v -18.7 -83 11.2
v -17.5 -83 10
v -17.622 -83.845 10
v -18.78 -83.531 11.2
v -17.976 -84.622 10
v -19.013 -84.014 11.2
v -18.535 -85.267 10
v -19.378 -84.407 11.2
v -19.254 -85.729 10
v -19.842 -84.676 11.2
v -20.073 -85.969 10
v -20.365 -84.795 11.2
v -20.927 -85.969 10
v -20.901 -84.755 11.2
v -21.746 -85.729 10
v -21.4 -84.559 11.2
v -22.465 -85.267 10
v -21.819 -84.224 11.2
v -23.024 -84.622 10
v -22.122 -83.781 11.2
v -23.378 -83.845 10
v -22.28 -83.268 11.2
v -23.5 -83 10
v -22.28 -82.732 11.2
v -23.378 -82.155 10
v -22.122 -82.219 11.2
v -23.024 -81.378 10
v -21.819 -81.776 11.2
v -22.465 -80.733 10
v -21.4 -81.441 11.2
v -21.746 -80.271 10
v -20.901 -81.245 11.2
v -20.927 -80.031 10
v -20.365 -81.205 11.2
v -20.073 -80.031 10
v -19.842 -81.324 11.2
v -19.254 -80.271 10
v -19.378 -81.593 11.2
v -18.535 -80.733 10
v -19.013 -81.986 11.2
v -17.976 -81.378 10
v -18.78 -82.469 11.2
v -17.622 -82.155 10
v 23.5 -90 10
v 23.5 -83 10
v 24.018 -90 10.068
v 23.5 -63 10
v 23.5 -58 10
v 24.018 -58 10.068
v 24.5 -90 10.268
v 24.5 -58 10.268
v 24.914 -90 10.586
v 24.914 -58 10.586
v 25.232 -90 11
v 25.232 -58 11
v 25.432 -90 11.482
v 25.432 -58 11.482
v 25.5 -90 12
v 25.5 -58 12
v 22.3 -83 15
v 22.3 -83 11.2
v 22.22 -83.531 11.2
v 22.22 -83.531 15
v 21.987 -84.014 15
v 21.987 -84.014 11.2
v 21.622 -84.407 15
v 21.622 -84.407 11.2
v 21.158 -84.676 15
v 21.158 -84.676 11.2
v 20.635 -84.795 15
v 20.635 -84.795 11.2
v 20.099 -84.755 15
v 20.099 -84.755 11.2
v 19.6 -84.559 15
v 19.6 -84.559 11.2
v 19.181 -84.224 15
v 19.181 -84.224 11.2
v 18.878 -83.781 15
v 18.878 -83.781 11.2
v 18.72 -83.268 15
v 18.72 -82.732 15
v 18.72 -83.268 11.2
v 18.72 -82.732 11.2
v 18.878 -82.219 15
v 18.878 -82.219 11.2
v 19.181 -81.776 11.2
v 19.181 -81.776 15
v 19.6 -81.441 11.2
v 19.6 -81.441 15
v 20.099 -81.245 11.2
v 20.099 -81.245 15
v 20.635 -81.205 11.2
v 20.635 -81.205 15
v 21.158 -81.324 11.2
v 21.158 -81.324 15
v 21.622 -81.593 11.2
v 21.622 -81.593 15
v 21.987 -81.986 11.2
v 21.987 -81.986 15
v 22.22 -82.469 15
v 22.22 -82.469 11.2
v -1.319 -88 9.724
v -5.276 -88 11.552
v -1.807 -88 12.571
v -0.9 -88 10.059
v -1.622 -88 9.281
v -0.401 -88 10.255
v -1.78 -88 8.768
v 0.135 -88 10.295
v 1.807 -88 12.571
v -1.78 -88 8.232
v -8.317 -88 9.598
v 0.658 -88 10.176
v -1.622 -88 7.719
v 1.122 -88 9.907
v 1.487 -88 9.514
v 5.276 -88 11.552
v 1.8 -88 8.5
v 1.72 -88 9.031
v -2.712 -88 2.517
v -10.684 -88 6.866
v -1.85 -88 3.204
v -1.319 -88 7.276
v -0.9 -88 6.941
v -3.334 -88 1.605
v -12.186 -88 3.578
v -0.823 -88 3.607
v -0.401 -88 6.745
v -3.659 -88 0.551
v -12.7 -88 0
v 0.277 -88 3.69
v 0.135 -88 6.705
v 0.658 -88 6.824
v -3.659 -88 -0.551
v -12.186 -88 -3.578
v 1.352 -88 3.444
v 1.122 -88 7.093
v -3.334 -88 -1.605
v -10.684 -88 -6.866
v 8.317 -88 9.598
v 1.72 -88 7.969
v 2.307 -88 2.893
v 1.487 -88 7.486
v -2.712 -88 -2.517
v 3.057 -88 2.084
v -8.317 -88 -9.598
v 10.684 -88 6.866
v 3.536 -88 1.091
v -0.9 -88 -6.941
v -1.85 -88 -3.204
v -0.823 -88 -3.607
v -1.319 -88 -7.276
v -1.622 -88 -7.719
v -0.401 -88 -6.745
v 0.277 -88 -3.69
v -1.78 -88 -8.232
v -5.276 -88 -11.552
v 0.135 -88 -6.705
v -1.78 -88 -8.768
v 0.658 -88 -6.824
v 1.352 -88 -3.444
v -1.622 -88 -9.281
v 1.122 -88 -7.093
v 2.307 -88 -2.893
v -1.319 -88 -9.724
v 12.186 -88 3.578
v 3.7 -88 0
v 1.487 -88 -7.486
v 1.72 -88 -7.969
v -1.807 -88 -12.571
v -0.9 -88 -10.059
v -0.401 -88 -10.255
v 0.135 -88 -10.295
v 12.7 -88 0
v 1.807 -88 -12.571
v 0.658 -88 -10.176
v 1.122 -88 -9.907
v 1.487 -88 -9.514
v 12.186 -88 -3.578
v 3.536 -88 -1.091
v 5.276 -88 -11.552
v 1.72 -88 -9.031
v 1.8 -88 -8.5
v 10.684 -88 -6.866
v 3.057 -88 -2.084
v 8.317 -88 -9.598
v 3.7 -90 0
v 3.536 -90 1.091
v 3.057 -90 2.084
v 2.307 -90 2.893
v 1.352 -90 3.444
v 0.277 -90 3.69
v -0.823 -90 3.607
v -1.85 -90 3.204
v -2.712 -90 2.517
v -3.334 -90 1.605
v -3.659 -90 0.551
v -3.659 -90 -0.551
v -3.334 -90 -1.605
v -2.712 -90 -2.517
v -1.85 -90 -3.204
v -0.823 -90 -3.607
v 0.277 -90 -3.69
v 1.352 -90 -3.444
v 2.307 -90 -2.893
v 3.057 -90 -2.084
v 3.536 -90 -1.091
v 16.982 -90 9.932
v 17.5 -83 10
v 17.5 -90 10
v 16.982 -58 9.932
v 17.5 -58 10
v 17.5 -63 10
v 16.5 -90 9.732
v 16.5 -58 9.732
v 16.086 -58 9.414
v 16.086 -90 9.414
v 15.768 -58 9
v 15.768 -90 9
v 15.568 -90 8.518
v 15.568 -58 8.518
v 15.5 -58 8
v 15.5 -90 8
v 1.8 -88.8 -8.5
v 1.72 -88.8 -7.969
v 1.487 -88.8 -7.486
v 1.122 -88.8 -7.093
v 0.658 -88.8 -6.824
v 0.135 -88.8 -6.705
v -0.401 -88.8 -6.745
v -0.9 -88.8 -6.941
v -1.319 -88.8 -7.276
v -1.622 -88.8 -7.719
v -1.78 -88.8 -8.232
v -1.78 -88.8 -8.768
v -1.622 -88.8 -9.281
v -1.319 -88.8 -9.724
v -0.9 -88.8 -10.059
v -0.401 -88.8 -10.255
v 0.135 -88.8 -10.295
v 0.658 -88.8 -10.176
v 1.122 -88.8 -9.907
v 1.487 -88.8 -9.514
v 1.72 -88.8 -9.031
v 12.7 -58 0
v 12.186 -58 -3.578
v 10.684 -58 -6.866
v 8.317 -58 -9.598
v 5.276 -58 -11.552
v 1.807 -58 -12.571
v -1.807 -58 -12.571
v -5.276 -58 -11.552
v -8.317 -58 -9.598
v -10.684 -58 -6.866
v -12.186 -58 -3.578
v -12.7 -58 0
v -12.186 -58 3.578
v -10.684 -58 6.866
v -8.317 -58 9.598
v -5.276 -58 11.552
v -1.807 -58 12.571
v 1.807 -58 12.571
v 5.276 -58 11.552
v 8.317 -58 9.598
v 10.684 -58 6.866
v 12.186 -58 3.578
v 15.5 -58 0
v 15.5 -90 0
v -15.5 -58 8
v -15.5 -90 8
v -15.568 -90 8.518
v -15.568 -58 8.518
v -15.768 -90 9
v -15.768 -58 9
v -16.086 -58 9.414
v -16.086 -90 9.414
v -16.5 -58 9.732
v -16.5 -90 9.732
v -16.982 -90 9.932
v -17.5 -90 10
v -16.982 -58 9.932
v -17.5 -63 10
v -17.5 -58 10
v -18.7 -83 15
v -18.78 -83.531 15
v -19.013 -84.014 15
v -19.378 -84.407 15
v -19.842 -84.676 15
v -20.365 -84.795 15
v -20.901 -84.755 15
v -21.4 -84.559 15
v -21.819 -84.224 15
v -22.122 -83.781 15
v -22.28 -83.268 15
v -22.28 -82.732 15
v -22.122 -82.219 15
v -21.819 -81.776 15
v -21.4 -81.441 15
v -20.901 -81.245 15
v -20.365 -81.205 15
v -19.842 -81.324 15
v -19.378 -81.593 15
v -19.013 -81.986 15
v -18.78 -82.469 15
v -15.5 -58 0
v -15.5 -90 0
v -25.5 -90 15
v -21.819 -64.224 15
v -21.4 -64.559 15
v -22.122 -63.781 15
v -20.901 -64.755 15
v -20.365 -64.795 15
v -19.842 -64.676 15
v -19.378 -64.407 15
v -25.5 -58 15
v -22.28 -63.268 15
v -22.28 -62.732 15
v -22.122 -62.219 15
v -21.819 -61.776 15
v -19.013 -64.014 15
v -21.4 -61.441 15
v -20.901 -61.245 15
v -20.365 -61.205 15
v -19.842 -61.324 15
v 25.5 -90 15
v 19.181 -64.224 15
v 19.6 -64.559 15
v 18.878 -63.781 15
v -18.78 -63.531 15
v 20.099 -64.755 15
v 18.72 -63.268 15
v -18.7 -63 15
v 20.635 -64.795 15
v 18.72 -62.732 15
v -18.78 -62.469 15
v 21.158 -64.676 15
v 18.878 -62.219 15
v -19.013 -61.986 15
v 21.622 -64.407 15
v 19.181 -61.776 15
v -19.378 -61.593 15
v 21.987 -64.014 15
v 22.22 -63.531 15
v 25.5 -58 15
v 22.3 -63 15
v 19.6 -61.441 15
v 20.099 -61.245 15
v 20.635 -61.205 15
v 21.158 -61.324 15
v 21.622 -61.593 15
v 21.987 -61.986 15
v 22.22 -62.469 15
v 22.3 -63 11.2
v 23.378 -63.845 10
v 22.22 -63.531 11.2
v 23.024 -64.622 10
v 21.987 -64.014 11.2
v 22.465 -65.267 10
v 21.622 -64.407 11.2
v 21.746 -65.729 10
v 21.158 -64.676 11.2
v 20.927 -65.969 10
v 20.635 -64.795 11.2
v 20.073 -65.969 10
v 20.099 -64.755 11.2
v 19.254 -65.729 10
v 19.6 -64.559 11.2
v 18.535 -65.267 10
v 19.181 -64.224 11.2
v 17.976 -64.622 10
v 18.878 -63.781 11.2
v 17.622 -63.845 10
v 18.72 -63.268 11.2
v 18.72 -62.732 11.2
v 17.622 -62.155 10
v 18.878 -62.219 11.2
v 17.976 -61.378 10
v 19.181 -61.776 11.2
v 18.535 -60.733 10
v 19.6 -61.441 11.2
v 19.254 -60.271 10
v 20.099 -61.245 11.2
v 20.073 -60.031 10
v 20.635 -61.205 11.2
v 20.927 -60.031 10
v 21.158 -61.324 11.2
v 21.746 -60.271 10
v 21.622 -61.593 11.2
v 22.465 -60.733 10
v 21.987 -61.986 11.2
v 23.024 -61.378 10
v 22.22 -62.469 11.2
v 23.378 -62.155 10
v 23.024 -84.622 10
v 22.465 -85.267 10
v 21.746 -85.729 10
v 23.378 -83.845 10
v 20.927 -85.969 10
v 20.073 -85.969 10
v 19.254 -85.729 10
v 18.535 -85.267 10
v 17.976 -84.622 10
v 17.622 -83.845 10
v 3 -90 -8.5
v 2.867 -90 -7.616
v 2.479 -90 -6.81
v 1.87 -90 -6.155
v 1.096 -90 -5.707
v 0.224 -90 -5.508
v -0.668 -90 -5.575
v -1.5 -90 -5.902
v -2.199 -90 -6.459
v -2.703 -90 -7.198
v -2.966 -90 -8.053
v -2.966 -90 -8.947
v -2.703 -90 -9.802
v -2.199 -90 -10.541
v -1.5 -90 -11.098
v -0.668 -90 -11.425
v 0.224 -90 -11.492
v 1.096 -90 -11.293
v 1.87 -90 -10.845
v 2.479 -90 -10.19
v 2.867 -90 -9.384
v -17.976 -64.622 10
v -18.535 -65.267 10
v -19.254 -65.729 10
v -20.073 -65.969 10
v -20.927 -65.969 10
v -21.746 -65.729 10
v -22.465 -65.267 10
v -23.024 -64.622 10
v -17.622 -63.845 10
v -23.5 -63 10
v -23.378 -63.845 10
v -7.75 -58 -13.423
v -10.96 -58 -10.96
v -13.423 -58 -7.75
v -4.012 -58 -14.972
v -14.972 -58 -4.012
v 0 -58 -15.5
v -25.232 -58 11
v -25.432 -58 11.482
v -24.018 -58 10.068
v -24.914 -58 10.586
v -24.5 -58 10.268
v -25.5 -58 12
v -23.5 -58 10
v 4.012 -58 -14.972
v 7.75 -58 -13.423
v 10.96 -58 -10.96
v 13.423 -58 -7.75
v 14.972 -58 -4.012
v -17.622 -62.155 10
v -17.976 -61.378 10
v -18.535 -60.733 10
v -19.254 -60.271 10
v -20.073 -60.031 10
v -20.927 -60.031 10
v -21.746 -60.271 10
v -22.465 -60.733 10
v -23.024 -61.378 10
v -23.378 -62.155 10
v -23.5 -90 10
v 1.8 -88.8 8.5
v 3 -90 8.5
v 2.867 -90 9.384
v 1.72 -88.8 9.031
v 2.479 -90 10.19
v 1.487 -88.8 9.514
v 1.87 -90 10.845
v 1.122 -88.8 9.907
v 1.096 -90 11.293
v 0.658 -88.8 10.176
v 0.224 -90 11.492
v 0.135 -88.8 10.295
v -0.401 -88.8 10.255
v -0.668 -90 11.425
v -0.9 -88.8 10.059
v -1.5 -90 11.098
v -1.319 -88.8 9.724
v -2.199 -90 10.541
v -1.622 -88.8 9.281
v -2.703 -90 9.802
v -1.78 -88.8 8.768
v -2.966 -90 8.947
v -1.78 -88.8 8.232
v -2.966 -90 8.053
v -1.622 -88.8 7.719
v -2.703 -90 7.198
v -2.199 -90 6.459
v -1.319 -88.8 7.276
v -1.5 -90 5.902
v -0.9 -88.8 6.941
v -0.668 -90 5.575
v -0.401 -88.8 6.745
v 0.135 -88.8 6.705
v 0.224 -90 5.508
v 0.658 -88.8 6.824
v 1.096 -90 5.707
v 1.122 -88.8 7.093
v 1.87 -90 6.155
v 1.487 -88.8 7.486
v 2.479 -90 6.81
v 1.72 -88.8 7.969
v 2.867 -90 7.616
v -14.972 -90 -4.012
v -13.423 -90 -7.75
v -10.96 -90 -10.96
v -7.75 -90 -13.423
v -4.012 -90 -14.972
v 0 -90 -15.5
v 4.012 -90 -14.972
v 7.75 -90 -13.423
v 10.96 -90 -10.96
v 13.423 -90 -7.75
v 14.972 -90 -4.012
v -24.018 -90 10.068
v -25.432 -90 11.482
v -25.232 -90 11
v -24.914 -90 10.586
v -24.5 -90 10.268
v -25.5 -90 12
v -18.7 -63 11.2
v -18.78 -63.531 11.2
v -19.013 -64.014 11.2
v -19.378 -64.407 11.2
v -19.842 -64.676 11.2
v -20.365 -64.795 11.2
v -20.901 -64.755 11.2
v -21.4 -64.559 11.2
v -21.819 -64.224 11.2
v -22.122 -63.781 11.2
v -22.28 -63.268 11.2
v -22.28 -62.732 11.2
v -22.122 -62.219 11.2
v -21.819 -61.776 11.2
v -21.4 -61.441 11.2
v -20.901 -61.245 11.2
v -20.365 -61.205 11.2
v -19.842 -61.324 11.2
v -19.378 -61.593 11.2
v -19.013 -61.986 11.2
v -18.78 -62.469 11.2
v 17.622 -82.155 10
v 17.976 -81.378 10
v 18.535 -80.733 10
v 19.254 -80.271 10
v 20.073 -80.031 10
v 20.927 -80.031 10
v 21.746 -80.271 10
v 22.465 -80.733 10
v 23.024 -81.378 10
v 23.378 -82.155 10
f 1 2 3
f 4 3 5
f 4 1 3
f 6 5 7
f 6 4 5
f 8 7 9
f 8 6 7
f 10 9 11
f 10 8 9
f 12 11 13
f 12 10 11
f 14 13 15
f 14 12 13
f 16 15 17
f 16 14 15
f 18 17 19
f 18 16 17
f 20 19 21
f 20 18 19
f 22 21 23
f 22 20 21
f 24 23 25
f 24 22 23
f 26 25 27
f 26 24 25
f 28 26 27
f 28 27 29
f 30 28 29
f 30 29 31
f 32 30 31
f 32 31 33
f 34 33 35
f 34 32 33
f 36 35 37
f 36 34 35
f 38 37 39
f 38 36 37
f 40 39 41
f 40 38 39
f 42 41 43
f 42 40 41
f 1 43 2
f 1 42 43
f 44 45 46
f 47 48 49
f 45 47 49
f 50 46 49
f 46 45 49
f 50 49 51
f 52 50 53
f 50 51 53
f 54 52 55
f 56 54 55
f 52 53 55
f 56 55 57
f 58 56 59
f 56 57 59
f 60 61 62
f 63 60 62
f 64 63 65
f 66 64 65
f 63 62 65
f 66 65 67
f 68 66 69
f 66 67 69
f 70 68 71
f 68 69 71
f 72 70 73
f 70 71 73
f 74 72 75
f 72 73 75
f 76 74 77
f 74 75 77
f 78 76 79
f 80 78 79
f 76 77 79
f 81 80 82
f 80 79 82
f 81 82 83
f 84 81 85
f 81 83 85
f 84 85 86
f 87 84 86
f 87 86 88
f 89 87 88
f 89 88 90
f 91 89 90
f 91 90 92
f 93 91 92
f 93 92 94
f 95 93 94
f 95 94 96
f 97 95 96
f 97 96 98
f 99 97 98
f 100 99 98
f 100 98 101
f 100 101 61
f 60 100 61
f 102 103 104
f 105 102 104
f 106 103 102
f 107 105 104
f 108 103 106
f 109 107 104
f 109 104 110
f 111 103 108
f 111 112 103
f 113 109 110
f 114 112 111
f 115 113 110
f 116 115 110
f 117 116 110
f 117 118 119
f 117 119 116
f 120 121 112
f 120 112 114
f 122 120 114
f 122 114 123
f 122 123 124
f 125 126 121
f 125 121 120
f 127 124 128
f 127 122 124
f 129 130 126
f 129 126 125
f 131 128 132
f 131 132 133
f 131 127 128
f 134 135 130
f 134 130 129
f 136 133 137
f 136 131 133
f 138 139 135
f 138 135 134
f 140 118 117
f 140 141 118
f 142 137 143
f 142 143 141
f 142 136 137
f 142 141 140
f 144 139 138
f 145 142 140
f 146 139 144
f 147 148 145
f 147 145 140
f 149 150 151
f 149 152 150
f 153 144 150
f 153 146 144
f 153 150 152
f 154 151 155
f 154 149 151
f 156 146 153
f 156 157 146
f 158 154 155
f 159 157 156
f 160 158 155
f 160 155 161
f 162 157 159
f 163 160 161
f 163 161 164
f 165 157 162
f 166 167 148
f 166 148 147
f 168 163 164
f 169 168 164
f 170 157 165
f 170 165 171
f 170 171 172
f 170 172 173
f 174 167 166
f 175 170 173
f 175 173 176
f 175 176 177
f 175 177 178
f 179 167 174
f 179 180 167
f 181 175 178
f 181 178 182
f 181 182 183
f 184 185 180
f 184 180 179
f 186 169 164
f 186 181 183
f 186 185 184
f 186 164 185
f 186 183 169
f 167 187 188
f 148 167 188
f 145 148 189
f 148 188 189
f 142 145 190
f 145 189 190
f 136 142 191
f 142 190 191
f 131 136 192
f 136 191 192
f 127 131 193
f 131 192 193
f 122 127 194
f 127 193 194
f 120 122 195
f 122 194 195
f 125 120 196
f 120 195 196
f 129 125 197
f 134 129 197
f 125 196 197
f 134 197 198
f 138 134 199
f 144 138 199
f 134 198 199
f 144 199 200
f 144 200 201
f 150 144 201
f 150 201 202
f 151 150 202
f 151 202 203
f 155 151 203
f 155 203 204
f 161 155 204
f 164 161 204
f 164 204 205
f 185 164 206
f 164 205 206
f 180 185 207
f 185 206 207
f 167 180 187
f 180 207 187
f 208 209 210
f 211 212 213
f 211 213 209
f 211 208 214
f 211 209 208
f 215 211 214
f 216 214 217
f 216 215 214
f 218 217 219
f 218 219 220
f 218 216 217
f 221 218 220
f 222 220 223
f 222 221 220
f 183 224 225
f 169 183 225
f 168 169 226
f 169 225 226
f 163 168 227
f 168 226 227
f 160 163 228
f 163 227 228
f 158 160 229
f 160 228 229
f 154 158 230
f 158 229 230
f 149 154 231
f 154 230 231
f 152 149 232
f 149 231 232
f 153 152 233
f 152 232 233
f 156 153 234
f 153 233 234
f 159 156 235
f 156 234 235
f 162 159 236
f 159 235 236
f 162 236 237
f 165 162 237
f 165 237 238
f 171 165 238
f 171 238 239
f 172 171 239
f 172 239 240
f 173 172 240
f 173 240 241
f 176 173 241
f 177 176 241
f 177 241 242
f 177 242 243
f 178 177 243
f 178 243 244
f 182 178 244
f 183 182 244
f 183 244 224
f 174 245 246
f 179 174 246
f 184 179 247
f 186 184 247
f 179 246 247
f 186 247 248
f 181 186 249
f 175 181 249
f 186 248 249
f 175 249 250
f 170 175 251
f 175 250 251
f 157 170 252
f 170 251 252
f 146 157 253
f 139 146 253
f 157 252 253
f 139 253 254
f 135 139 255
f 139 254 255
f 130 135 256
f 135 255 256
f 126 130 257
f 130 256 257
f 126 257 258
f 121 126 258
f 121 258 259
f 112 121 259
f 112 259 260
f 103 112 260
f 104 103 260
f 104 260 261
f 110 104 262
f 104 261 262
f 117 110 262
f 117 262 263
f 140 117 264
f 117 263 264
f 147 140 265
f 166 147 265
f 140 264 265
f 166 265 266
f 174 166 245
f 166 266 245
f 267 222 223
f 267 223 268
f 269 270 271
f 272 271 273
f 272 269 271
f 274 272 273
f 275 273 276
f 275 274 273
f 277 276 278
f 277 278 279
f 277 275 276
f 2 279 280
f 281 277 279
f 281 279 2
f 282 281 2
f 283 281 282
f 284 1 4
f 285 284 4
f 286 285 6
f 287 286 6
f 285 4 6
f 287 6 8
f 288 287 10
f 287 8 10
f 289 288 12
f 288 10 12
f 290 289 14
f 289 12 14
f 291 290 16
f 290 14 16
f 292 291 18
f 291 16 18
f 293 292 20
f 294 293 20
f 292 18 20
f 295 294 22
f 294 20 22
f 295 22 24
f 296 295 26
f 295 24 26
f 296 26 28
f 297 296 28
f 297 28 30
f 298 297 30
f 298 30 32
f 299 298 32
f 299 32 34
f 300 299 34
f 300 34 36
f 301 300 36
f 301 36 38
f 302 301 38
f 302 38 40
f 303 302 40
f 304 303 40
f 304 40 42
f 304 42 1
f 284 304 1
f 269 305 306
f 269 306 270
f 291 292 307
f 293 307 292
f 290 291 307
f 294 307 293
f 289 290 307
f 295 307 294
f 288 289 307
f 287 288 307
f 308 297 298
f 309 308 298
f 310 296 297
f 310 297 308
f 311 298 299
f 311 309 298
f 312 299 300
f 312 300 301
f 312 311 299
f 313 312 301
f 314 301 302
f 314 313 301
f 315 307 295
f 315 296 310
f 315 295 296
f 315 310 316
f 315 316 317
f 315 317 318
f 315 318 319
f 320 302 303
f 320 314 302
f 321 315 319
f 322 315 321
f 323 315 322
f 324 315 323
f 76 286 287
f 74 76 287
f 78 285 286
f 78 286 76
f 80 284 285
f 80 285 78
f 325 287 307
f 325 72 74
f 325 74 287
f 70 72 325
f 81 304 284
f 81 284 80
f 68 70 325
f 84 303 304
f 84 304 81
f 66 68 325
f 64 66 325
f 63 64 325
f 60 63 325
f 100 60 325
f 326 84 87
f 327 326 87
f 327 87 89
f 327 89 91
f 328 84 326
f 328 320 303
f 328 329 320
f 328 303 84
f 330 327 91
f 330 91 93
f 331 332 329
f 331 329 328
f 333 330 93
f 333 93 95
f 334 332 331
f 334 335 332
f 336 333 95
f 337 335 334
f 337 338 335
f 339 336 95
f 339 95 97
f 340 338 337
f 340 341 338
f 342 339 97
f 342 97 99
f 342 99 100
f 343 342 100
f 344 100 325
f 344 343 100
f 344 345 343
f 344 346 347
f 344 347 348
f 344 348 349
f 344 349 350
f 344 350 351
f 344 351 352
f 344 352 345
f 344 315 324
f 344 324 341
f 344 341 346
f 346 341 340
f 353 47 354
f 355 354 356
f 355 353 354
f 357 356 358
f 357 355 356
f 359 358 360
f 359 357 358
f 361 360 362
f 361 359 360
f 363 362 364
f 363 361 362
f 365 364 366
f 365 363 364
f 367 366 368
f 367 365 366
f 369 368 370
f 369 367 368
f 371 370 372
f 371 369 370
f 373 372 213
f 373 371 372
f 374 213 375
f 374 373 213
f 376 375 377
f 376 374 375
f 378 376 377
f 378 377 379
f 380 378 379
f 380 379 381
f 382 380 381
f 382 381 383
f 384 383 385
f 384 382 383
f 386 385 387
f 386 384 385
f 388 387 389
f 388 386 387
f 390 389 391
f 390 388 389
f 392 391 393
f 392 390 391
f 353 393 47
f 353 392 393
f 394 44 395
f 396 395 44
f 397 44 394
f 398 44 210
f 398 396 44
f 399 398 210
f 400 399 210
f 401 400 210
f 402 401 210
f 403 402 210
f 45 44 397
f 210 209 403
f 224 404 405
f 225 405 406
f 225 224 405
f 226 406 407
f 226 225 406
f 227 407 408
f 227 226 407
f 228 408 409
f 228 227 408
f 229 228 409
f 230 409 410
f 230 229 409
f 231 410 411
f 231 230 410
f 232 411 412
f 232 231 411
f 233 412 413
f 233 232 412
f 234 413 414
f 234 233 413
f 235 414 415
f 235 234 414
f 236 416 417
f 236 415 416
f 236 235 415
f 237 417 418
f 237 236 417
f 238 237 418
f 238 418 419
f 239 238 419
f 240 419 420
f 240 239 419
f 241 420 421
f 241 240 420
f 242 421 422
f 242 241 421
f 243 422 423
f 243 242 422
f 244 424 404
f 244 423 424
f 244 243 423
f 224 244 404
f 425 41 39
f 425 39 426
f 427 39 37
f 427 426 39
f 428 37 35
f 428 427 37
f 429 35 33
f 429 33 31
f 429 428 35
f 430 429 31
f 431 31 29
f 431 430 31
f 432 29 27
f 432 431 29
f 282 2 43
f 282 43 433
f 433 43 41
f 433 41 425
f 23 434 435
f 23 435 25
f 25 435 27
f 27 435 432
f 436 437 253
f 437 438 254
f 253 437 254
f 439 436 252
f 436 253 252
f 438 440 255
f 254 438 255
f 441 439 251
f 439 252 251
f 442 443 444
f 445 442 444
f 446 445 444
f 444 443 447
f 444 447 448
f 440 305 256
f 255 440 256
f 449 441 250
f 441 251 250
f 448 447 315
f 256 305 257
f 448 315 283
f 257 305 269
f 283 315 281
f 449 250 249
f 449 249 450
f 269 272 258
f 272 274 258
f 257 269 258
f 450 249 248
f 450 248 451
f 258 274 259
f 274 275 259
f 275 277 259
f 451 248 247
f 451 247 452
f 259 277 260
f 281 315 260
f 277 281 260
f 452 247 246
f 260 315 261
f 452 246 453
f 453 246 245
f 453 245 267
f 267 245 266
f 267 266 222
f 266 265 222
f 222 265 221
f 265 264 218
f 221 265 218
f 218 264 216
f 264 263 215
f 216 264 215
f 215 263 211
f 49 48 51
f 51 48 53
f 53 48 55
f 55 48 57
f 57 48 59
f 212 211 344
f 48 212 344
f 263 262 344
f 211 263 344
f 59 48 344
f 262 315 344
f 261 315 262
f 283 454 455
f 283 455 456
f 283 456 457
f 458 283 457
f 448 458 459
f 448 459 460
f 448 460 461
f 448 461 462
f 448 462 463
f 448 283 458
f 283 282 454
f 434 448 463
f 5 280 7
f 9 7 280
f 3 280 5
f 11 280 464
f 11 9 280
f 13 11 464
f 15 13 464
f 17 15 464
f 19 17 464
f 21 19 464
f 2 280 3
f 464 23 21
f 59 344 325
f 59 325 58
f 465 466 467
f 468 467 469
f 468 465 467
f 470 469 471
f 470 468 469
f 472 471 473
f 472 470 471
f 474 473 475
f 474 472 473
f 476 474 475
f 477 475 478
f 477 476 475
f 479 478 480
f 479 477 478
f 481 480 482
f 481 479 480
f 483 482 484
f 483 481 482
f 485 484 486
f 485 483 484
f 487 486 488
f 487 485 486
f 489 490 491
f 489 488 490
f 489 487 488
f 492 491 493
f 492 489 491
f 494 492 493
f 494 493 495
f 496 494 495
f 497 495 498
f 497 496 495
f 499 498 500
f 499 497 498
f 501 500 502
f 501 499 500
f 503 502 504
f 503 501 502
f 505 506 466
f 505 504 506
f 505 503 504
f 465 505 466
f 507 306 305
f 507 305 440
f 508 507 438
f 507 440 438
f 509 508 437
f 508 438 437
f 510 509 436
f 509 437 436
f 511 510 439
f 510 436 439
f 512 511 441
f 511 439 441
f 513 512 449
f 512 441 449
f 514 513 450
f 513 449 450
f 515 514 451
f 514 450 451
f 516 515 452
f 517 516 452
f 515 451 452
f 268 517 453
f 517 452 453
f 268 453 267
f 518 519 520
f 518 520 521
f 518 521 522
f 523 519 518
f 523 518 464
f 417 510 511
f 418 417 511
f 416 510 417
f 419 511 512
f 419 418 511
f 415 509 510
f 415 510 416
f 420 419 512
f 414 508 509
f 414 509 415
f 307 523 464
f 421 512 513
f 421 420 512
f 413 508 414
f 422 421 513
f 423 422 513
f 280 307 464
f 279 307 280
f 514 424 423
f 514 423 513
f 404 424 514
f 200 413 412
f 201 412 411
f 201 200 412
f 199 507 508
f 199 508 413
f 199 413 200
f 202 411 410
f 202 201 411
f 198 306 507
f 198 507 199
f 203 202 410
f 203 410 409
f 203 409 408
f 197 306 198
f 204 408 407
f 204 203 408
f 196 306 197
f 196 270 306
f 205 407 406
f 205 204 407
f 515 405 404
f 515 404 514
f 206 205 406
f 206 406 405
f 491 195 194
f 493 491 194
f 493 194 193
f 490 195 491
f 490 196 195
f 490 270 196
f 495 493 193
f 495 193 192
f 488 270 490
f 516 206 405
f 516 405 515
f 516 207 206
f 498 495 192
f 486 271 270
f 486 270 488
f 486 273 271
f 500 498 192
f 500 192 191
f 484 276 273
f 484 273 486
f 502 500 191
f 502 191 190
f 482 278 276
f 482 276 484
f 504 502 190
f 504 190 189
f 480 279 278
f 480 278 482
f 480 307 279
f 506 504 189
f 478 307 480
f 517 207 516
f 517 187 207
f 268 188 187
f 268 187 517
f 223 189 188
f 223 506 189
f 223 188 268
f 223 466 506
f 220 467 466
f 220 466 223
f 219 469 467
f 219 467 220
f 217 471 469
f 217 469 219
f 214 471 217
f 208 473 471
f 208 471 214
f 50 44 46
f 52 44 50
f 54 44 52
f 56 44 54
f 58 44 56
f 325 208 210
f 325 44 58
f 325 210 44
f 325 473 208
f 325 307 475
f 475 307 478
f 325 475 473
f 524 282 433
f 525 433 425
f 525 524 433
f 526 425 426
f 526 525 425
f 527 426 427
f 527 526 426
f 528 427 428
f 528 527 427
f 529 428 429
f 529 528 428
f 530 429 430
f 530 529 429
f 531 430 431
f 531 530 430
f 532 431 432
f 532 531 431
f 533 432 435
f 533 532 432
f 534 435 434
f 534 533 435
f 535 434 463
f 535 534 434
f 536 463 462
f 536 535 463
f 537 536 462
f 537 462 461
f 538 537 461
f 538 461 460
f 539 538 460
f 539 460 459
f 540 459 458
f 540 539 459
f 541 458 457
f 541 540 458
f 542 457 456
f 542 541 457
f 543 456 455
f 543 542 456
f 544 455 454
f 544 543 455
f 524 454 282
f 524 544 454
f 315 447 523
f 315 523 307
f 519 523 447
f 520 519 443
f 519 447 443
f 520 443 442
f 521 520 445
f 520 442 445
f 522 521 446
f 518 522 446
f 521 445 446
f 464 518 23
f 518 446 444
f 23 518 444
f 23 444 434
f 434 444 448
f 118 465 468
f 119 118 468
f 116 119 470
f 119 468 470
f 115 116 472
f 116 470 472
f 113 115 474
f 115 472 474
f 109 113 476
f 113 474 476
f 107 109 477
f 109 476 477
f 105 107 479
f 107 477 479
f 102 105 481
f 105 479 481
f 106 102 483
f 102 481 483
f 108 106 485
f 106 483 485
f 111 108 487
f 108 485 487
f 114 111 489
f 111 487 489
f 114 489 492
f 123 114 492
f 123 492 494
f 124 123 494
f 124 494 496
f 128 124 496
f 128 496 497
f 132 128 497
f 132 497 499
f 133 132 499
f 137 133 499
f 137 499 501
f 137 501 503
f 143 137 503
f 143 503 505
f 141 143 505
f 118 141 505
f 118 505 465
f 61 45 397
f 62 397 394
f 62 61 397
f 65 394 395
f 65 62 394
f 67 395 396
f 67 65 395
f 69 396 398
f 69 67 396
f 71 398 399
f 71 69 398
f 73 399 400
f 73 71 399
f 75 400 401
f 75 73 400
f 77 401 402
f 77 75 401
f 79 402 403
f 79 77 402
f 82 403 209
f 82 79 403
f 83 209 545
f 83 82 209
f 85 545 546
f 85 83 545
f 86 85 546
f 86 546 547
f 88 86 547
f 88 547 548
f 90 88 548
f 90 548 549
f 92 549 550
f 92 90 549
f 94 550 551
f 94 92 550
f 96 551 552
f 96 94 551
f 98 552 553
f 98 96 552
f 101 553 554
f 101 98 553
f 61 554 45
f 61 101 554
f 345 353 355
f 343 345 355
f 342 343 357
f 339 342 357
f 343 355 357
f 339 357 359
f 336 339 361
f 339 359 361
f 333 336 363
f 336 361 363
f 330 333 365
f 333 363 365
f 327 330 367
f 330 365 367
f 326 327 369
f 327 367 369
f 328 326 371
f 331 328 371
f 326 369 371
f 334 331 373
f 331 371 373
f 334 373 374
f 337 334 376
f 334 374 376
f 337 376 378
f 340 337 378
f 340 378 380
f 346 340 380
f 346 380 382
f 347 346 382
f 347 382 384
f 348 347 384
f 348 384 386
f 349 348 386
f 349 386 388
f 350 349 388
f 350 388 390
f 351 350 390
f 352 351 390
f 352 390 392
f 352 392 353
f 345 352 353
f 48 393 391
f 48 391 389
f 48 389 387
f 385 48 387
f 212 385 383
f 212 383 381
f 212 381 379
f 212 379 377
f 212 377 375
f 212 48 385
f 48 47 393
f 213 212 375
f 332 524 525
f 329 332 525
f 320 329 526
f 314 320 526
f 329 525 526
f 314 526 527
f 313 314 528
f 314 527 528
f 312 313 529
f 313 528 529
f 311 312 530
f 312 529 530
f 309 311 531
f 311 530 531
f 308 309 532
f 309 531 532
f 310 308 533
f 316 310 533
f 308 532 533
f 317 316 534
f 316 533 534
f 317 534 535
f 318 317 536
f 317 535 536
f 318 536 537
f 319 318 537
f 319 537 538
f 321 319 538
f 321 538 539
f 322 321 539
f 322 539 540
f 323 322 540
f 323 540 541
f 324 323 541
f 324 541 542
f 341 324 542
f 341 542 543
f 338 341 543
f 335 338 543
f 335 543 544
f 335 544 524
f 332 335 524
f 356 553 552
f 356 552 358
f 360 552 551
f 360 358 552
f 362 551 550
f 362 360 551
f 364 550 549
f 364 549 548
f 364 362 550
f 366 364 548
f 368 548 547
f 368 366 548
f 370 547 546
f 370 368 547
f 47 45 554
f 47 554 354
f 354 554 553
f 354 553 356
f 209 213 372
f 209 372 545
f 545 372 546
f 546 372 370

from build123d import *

# Parameters (mm, degrees)
PAD001_START    = 60
PAD001_DEPTH    = 32
SKETCH002_R     = 12.7
POCKET_DEPTH    = 30
SKETCH003_R     = 1.8
SKETCH003_R_2   = 3.7
POCKET001_DEPTH = 2
SKETCH004_R     = 1.8
POCKET002_DEPTH = 5.001
SKETCH010_R     = 3
POCKET006_DEPTH = 1.2
POCKET006_TAPER = 45
SKETCH033_R     = 3
POCKET020_DEPTH = 2
POCKET020_TAPER = 45


with BuildPart() as part:
    # Sketch001 → Pad001 (new body)
    with BuildSketch(Plane.XZ.offset(PAD001_START)):
        with BuildLine():
            ThreePointArc((-15.5, 0), (0, -15.5), (15.5, 0))
            Line((15.5, 8), (15.5, 0))
            ThreePointArc((17.5, 10), (16.085786, 9.414214), (15.5, 8))
            Line((23.5, 10), (17.5, 10))
            ThreePointArc((23.5, 10), (24.914214, 10.585786), (25.5, 12))
            Line((25.5, 15), (25.5, 12))
            Line((-25.5, 15), (25.5, 15))
            Line((-25.5, 12), (-25.5, 15))
            ThreePointArc((-25.5, 12), (-24.914214, 10.585786), (-23.5, 10))
            Line((-17.5, 10), (-23.5, 10))
            ThreePointArc((-15.5, 8), (-16.085786, 9.414214), (-17.5, 10))
            Line((-15.5, 0), (-15.5, 8))
        make_face()
    extrude(amount=PAD001_DEPTH)

    # Sketch002 (on Face13 of Pad001) → Pocket (cut)
    with BuildSketch(Plane(origin=(0, -60, 0), x_dir=(1, 0, 0), z_dir=(0, 1, 0))):
        Circle(SKETCH002_R)
    extrude(amount=-POCKET_DEPTH, mode=Mode.SUBTRACT)

    # Sketch003 (on Face5 of Pocket) → Pocket001 (cut)
    with BuildSketch(Plane.XZ.offset(92)):
        with Locations((0, 8.5)):
            Circle(SKETCH003_R)
        with Locations((0, -8.5)):
            Circle(SKETCH003_R)
        Circle(SKETCH003_R_2)
    extrude(amount=-POCKET001_DEPTH, mode=Mode.SUBTRACT)

    # Sketch004 (on Face3 of Pocket001) → Pocket002 (cut, through all)
    with BuildSketch(Plane(origin=(0, 0, 10), x_dir=(1, 0, 0), z_dir=(0, 0, -1))):
        with Locations((-20.5, 85)):
            Circle(SKETCH004_R)
        with Locations((-20.5, 65)):
            Circle(SKETCH004_R)
        with Locations((20.5, 65)):
            Circle(SKETCH004_R)
        with Locations((20.5, 85)):
            Circle(SKETCH004_R)
    extrude(amount=-POCKET002_DEPTH, mode=Mode.SUBTRACT)

    # Sketch010 (on Face3 of Pocket002) → Pocket006 (cut)
    with BuildSketch(Plane(origin=(0, 0, 10), x_dir=(1, 0, 0), z_dir=(0, 0, -1))):
        with Locations((-20.5, 85)):
            Circle(SKETCH010_R)
        with Locations((20.5, 85)):
            Circle(SKETCH010_R)
        with Locations((20.5, 65)):
            Circle(SKETCH010_R)
        with Locations((-20.5, 65)):
            Circle(SKETCH010_R)
    extrude(amount=-POCKET006_DEPTH, taper=POCKET006_TAPER, mode=Mode.SUBTRACT)

    # Sketch033 (on Face7 of Pocket006) → Pocket020 (cut)
    with BuildSketch(Plane.XZ.offset(92)):
        with Locations((0, 8.5)):
            Circle(SKETCH033_R)
        with Locations((0, -8.5)):
            Circle(SKETCH033_R)
    extrude(amount=-POCKET020_DEPTH, taper=POCKET020_TAPER, mode=Mode.SUBTRACT)


with BuildPart() as part_1:
    # Body001 placement: moved
    add(part.part.moved(Location((0, 2, 0))))


solid = part_1.part
